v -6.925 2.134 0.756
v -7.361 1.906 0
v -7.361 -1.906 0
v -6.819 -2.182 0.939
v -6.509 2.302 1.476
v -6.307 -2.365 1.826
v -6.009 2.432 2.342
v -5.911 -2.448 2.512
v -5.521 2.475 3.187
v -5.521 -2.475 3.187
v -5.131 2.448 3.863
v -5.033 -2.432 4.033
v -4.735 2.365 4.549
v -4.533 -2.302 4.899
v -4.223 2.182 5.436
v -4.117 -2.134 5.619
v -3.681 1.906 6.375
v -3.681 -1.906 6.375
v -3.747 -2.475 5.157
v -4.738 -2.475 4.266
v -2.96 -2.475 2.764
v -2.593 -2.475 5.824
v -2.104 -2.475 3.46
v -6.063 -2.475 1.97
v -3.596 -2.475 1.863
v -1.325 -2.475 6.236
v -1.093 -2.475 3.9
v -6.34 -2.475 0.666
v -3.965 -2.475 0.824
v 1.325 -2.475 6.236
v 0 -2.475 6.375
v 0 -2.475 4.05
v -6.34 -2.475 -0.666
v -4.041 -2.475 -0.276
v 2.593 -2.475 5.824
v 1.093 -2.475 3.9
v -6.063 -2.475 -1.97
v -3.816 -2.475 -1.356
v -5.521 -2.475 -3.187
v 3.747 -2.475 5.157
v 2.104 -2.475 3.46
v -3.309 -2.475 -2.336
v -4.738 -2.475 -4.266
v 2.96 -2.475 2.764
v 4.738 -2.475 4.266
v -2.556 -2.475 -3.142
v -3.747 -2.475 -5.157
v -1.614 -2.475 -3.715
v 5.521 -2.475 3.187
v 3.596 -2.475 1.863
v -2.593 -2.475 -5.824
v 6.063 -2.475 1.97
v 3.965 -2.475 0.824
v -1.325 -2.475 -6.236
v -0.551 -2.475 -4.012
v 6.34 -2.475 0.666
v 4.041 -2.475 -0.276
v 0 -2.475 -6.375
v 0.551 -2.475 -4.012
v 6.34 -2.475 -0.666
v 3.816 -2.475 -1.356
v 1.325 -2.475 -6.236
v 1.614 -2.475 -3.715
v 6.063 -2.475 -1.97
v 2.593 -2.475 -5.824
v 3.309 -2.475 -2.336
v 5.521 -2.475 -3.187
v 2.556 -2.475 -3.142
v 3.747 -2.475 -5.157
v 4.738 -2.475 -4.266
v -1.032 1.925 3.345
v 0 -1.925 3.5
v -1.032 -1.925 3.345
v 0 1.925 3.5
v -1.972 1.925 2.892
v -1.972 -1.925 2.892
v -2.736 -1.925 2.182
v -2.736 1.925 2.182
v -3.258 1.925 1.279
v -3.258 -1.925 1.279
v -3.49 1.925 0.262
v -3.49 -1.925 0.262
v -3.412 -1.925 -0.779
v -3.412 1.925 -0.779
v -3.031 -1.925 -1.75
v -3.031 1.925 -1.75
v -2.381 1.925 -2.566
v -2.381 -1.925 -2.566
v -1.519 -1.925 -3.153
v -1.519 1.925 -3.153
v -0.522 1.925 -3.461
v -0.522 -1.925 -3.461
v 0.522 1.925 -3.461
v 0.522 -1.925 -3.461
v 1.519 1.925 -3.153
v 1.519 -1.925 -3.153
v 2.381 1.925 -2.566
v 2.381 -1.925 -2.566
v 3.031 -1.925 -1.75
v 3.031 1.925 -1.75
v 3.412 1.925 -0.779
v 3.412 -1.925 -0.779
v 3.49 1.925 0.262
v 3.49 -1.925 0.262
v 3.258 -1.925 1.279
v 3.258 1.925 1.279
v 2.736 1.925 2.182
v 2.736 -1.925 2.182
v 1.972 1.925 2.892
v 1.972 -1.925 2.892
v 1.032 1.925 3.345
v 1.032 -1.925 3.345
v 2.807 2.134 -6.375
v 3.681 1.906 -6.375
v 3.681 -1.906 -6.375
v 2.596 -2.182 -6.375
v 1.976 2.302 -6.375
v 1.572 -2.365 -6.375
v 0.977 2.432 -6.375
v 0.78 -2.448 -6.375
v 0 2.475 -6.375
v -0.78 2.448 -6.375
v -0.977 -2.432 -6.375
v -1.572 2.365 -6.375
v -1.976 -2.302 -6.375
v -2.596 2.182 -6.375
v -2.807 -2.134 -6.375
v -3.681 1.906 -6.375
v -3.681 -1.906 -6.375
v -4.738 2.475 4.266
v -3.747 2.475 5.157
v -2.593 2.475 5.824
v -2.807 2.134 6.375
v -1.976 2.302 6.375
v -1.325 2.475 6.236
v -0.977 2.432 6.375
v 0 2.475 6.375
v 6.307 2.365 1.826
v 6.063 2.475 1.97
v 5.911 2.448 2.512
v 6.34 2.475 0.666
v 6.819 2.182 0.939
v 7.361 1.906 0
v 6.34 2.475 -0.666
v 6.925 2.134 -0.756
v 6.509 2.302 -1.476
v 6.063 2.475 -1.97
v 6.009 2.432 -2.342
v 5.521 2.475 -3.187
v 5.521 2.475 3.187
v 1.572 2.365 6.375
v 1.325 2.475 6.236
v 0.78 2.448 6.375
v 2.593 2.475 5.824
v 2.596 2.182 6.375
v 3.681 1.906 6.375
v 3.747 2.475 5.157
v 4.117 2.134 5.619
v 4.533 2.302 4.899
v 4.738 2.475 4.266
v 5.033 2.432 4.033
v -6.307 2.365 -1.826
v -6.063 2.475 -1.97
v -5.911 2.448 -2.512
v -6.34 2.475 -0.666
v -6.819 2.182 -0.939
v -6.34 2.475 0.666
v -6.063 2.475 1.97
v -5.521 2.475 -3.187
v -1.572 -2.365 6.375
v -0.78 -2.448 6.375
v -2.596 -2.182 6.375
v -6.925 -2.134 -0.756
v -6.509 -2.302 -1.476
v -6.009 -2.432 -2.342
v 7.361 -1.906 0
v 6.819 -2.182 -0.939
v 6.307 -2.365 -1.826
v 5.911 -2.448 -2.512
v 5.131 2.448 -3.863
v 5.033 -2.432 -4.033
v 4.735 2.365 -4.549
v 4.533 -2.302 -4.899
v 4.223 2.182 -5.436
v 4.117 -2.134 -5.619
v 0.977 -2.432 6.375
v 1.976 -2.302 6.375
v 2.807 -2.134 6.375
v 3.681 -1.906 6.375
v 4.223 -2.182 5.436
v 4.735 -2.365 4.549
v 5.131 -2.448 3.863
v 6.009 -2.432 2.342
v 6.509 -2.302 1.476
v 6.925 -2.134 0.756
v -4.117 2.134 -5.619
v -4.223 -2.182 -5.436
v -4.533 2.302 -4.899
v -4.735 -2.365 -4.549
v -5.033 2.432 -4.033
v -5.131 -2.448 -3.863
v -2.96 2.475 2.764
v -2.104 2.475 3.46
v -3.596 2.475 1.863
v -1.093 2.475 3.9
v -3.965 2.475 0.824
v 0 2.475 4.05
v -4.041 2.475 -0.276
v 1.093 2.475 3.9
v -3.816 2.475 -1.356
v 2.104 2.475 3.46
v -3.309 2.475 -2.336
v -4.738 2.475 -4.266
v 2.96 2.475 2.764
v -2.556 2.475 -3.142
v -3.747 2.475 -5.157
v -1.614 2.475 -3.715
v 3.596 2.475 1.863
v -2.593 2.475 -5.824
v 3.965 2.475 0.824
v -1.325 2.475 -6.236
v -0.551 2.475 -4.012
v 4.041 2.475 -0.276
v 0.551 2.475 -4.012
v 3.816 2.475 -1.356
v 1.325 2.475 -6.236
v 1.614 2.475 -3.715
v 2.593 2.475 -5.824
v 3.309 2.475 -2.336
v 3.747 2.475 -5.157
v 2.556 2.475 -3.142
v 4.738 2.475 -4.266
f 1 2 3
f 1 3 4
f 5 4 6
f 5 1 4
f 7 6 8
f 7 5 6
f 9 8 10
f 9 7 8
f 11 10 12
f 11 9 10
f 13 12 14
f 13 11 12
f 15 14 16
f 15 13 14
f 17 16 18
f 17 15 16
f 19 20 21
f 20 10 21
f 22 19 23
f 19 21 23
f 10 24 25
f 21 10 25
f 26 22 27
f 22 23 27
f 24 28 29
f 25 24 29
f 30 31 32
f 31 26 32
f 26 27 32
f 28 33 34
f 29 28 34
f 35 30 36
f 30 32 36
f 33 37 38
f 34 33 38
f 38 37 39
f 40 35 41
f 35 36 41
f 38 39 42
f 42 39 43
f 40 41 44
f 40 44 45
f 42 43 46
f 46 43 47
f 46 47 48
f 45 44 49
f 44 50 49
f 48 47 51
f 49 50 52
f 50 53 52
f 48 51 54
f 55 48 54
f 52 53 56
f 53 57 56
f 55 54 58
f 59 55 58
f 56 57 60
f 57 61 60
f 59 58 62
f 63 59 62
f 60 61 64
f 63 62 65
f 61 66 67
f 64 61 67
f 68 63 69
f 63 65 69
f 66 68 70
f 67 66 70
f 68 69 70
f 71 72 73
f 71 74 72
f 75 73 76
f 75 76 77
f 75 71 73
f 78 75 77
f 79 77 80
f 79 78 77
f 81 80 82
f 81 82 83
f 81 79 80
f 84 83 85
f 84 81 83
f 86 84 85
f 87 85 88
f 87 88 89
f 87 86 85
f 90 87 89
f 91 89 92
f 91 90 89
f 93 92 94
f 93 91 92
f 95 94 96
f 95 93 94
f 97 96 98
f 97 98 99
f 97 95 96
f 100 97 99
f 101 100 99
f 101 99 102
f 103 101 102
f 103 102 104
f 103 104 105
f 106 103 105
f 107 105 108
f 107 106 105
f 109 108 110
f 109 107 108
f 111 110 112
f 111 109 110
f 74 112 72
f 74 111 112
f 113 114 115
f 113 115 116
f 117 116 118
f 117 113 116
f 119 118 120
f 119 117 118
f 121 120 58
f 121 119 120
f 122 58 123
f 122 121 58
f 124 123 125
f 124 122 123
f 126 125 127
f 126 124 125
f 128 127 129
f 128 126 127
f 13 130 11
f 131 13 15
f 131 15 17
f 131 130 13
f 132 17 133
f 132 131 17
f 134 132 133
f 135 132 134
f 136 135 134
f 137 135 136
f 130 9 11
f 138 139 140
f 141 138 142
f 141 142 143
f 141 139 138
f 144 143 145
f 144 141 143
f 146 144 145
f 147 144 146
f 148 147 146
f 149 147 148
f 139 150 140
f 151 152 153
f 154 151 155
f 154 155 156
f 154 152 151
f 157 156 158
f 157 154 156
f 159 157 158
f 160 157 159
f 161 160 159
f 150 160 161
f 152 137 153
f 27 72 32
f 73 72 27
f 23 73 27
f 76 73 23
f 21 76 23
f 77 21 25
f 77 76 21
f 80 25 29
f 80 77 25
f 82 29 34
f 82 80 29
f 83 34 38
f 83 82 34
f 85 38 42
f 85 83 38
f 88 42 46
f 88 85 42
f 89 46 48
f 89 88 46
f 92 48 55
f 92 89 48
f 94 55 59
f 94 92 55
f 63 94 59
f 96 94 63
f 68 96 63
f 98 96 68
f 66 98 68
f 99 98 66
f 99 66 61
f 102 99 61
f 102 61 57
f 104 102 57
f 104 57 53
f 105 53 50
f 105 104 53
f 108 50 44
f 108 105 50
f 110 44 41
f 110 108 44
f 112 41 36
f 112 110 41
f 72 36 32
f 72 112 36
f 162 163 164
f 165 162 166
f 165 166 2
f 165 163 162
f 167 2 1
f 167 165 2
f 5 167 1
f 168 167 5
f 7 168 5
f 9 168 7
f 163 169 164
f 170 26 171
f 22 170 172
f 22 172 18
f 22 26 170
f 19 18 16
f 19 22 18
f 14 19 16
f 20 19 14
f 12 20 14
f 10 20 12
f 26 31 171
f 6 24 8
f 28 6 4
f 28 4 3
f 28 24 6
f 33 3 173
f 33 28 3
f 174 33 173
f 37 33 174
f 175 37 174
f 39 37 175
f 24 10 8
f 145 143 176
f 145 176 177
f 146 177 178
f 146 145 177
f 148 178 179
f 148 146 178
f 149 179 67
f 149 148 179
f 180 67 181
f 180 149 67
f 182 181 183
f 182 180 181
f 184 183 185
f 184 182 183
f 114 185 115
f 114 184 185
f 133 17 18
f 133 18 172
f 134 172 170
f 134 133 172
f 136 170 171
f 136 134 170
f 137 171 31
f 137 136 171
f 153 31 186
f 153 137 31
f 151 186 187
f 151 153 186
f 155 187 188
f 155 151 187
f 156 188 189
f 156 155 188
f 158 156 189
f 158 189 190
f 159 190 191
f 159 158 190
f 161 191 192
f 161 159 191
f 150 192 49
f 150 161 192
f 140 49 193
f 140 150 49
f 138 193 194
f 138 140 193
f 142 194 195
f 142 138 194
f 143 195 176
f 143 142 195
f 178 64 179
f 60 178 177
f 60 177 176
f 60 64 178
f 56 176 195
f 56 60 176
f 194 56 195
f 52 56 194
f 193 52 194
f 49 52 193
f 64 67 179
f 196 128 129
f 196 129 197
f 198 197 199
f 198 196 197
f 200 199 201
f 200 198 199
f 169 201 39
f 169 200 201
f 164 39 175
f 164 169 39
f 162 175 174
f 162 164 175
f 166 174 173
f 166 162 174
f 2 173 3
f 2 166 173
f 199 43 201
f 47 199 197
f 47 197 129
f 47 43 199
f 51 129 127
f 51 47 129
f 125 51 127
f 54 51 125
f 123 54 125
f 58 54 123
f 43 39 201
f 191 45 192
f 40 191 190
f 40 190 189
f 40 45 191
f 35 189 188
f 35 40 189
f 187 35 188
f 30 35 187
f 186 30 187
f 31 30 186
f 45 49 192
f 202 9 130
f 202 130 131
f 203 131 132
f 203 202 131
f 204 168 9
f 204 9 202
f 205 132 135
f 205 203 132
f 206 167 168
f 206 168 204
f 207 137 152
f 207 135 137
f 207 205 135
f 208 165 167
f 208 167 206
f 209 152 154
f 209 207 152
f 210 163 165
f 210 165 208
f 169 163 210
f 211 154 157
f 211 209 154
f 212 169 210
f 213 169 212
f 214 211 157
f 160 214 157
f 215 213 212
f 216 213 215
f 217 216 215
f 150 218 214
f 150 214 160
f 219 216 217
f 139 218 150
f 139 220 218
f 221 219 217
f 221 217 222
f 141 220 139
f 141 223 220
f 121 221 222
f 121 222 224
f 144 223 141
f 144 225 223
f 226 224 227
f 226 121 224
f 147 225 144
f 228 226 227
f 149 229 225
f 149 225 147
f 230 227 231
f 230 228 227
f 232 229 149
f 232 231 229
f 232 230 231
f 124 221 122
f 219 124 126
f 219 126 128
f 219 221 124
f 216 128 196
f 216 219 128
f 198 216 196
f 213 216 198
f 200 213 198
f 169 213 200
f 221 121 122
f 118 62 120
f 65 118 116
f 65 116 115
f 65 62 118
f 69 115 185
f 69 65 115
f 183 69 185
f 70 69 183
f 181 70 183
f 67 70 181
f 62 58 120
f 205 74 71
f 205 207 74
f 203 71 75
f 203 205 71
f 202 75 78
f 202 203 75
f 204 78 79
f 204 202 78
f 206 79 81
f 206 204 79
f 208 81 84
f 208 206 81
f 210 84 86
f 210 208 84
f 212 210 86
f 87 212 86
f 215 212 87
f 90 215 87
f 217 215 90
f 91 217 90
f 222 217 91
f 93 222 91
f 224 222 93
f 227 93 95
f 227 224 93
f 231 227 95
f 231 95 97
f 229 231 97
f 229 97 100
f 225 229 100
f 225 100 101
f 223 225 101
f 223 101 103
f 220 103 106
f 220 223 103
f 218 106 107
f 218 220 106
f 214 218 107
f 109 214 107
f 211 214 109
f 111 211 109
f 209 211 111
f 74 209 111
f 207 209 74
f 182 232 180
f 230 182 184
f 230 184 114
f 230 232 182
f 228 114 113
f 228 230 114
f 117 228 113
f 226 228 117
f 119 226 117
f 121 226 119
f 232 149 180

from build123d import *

# Parameters (mm, degrees)
BOSS_EXTRUDE1_DEPTH     = 2.475
SKETCH2_OUTSIDE_W       = 37.888
SKETCH2_OUTSIDE_H       = 35.916
SKETCH2_OUTSIDE_R       = 6.375
CUT_EXTRUDE1_DEPTH      = 4.95
CUT_EXTRUDE1_DRAFT      = -60
MIRROR1_COPY_1_SKETCH_W = 37.888
MIRROR1_COPY_1_SKETCH_H = 35.916
MIRROR1_COPY_1_SKETCH_R = 6.375
MIRROR1_COPY_1_DEPTH    = 4.95
MIRROR1_COPY_1_DRAFT    = -60


with BuildPart() as part:
    # Sketch1 → Boss-Extrude1 (new, symmetric)
    with BuildSketch(Plane(origin=(0, 0, 0), x_dir=(1, 0, 0), z_dir=(0, 1, 0))):
        Polygon((3.680607966, -6.375), (7.361215932, 0), (3.680607966, 6.375), (-3.680607966, 6.375), (-7.361215932, 0), (-3.680607966, -6.375), align=None)
    extrude(amount=BOSS_EXTRUDE1_DEPTH, both=True)


with BuildPart() as cut_extrude1_tool:
    # Sketch2 outside → Cut-Extrude1 (with draft: the straight prism first)
    with BuildSketch(Plane(origin=(0, 2.475, 0), x_dir=(1, 0, 0), z_dir=(0, 1, 0))):
        Rectangle(SKETCH2_OUTSIDE_W, SKETCH2_OUTSIDE_H)
        Circle(SKETCH2_OUTSIDE_R, mode=Mode.SUBTRACT)
    extrude(amount=-CUT_EXTRUDE1_DEPTH)
    # Cut-Extrude1: the draft: its side faces are tilted about the plane it starts from
    cut_extrude1_sides = [cut_extrude1_tool.faces().sort_by_distance(p)[0] for p in [
        (0, 0, 17.958),
        (18.944, 0, 0),
        (0, 0, -17.958),
        (-18.944, 0, 0),
        (-6.375, 0, 0),
    ]]
    draft(cut_extrude1_sides, Plane(origin=(0, 2.475, 0), x_dir=(1, 0, 0), z_dir=(0, 1, 0)), CUT_EXTRUDE1_DRAFT)


with BuildPart() as part_1:
    add(part.part)

    # Cut-Extrude1: cut by cut_extrude1_tool
    add(cut_extrude1_tool.part, mode=Mode.SUBTRACT)


with BuildPart() as mirror1_copy_1_tool:
    # Mirror1 copy 1 sketch → Mirror1 copy 1 (with draft: the straight prism first)
    with BuildSketch(Plane.XZ.offset(2.475)):
        Rectangle(MIRROR1_COPY_1_SKETCH_W, MIRROR1_COPY_1_SKETCH_H)
        Circle(MIRROR1_COPY_1_SKETCH_R, mode=Mode.SUBTRACT)
    extrude(amount=-MIRROR1_COPY_1_DEPTH)
    # Mirror1 copy 1: the draft: its side faces are tilted about the plane it starts from
    mirror1_copy_1_sides = [mirror1_copy_1_tool.faces().sort_by_distance(p)[0] for p in [
        (0, 0, 17.958),
        (18.944, 0, 0),
        (0, 0, -17.958),
        (-18.944, 0, 0),
        (-6.375, 0, 0),
    ]]
    draft(mirror1_copy_1_sides, Plane.XZ.offset(2.475), MIRROR1_COPY_1_DRAFT)


with BuildPart() as part_2:
    add(part_1.part)

    # Mirror1 copy 1: cut by mirror1_copy_1_tool
    add(mirror1_copy_1_tool.part, mode=Mode.SUBTRACT)

    # Sketch5 → M8x1.0 Tapped Hole1 (revolve, cut)
    with BuildSketch(Plane(origin=(0, 2.475, 0), x_dir=(0, 0, 1), z_dir=(1, 0, 0))):
        Polygon((0, 0), (0, 4.95), (4.05, 4.95), (3.5, 4.4), (3.5, 0.55), (4.05, 0), align=None)
    revolve(axis=Axis((0, 8.825, 0), (0, -1, 0)), mode=Mode.SUBTRACT)


solid = part_2.part
